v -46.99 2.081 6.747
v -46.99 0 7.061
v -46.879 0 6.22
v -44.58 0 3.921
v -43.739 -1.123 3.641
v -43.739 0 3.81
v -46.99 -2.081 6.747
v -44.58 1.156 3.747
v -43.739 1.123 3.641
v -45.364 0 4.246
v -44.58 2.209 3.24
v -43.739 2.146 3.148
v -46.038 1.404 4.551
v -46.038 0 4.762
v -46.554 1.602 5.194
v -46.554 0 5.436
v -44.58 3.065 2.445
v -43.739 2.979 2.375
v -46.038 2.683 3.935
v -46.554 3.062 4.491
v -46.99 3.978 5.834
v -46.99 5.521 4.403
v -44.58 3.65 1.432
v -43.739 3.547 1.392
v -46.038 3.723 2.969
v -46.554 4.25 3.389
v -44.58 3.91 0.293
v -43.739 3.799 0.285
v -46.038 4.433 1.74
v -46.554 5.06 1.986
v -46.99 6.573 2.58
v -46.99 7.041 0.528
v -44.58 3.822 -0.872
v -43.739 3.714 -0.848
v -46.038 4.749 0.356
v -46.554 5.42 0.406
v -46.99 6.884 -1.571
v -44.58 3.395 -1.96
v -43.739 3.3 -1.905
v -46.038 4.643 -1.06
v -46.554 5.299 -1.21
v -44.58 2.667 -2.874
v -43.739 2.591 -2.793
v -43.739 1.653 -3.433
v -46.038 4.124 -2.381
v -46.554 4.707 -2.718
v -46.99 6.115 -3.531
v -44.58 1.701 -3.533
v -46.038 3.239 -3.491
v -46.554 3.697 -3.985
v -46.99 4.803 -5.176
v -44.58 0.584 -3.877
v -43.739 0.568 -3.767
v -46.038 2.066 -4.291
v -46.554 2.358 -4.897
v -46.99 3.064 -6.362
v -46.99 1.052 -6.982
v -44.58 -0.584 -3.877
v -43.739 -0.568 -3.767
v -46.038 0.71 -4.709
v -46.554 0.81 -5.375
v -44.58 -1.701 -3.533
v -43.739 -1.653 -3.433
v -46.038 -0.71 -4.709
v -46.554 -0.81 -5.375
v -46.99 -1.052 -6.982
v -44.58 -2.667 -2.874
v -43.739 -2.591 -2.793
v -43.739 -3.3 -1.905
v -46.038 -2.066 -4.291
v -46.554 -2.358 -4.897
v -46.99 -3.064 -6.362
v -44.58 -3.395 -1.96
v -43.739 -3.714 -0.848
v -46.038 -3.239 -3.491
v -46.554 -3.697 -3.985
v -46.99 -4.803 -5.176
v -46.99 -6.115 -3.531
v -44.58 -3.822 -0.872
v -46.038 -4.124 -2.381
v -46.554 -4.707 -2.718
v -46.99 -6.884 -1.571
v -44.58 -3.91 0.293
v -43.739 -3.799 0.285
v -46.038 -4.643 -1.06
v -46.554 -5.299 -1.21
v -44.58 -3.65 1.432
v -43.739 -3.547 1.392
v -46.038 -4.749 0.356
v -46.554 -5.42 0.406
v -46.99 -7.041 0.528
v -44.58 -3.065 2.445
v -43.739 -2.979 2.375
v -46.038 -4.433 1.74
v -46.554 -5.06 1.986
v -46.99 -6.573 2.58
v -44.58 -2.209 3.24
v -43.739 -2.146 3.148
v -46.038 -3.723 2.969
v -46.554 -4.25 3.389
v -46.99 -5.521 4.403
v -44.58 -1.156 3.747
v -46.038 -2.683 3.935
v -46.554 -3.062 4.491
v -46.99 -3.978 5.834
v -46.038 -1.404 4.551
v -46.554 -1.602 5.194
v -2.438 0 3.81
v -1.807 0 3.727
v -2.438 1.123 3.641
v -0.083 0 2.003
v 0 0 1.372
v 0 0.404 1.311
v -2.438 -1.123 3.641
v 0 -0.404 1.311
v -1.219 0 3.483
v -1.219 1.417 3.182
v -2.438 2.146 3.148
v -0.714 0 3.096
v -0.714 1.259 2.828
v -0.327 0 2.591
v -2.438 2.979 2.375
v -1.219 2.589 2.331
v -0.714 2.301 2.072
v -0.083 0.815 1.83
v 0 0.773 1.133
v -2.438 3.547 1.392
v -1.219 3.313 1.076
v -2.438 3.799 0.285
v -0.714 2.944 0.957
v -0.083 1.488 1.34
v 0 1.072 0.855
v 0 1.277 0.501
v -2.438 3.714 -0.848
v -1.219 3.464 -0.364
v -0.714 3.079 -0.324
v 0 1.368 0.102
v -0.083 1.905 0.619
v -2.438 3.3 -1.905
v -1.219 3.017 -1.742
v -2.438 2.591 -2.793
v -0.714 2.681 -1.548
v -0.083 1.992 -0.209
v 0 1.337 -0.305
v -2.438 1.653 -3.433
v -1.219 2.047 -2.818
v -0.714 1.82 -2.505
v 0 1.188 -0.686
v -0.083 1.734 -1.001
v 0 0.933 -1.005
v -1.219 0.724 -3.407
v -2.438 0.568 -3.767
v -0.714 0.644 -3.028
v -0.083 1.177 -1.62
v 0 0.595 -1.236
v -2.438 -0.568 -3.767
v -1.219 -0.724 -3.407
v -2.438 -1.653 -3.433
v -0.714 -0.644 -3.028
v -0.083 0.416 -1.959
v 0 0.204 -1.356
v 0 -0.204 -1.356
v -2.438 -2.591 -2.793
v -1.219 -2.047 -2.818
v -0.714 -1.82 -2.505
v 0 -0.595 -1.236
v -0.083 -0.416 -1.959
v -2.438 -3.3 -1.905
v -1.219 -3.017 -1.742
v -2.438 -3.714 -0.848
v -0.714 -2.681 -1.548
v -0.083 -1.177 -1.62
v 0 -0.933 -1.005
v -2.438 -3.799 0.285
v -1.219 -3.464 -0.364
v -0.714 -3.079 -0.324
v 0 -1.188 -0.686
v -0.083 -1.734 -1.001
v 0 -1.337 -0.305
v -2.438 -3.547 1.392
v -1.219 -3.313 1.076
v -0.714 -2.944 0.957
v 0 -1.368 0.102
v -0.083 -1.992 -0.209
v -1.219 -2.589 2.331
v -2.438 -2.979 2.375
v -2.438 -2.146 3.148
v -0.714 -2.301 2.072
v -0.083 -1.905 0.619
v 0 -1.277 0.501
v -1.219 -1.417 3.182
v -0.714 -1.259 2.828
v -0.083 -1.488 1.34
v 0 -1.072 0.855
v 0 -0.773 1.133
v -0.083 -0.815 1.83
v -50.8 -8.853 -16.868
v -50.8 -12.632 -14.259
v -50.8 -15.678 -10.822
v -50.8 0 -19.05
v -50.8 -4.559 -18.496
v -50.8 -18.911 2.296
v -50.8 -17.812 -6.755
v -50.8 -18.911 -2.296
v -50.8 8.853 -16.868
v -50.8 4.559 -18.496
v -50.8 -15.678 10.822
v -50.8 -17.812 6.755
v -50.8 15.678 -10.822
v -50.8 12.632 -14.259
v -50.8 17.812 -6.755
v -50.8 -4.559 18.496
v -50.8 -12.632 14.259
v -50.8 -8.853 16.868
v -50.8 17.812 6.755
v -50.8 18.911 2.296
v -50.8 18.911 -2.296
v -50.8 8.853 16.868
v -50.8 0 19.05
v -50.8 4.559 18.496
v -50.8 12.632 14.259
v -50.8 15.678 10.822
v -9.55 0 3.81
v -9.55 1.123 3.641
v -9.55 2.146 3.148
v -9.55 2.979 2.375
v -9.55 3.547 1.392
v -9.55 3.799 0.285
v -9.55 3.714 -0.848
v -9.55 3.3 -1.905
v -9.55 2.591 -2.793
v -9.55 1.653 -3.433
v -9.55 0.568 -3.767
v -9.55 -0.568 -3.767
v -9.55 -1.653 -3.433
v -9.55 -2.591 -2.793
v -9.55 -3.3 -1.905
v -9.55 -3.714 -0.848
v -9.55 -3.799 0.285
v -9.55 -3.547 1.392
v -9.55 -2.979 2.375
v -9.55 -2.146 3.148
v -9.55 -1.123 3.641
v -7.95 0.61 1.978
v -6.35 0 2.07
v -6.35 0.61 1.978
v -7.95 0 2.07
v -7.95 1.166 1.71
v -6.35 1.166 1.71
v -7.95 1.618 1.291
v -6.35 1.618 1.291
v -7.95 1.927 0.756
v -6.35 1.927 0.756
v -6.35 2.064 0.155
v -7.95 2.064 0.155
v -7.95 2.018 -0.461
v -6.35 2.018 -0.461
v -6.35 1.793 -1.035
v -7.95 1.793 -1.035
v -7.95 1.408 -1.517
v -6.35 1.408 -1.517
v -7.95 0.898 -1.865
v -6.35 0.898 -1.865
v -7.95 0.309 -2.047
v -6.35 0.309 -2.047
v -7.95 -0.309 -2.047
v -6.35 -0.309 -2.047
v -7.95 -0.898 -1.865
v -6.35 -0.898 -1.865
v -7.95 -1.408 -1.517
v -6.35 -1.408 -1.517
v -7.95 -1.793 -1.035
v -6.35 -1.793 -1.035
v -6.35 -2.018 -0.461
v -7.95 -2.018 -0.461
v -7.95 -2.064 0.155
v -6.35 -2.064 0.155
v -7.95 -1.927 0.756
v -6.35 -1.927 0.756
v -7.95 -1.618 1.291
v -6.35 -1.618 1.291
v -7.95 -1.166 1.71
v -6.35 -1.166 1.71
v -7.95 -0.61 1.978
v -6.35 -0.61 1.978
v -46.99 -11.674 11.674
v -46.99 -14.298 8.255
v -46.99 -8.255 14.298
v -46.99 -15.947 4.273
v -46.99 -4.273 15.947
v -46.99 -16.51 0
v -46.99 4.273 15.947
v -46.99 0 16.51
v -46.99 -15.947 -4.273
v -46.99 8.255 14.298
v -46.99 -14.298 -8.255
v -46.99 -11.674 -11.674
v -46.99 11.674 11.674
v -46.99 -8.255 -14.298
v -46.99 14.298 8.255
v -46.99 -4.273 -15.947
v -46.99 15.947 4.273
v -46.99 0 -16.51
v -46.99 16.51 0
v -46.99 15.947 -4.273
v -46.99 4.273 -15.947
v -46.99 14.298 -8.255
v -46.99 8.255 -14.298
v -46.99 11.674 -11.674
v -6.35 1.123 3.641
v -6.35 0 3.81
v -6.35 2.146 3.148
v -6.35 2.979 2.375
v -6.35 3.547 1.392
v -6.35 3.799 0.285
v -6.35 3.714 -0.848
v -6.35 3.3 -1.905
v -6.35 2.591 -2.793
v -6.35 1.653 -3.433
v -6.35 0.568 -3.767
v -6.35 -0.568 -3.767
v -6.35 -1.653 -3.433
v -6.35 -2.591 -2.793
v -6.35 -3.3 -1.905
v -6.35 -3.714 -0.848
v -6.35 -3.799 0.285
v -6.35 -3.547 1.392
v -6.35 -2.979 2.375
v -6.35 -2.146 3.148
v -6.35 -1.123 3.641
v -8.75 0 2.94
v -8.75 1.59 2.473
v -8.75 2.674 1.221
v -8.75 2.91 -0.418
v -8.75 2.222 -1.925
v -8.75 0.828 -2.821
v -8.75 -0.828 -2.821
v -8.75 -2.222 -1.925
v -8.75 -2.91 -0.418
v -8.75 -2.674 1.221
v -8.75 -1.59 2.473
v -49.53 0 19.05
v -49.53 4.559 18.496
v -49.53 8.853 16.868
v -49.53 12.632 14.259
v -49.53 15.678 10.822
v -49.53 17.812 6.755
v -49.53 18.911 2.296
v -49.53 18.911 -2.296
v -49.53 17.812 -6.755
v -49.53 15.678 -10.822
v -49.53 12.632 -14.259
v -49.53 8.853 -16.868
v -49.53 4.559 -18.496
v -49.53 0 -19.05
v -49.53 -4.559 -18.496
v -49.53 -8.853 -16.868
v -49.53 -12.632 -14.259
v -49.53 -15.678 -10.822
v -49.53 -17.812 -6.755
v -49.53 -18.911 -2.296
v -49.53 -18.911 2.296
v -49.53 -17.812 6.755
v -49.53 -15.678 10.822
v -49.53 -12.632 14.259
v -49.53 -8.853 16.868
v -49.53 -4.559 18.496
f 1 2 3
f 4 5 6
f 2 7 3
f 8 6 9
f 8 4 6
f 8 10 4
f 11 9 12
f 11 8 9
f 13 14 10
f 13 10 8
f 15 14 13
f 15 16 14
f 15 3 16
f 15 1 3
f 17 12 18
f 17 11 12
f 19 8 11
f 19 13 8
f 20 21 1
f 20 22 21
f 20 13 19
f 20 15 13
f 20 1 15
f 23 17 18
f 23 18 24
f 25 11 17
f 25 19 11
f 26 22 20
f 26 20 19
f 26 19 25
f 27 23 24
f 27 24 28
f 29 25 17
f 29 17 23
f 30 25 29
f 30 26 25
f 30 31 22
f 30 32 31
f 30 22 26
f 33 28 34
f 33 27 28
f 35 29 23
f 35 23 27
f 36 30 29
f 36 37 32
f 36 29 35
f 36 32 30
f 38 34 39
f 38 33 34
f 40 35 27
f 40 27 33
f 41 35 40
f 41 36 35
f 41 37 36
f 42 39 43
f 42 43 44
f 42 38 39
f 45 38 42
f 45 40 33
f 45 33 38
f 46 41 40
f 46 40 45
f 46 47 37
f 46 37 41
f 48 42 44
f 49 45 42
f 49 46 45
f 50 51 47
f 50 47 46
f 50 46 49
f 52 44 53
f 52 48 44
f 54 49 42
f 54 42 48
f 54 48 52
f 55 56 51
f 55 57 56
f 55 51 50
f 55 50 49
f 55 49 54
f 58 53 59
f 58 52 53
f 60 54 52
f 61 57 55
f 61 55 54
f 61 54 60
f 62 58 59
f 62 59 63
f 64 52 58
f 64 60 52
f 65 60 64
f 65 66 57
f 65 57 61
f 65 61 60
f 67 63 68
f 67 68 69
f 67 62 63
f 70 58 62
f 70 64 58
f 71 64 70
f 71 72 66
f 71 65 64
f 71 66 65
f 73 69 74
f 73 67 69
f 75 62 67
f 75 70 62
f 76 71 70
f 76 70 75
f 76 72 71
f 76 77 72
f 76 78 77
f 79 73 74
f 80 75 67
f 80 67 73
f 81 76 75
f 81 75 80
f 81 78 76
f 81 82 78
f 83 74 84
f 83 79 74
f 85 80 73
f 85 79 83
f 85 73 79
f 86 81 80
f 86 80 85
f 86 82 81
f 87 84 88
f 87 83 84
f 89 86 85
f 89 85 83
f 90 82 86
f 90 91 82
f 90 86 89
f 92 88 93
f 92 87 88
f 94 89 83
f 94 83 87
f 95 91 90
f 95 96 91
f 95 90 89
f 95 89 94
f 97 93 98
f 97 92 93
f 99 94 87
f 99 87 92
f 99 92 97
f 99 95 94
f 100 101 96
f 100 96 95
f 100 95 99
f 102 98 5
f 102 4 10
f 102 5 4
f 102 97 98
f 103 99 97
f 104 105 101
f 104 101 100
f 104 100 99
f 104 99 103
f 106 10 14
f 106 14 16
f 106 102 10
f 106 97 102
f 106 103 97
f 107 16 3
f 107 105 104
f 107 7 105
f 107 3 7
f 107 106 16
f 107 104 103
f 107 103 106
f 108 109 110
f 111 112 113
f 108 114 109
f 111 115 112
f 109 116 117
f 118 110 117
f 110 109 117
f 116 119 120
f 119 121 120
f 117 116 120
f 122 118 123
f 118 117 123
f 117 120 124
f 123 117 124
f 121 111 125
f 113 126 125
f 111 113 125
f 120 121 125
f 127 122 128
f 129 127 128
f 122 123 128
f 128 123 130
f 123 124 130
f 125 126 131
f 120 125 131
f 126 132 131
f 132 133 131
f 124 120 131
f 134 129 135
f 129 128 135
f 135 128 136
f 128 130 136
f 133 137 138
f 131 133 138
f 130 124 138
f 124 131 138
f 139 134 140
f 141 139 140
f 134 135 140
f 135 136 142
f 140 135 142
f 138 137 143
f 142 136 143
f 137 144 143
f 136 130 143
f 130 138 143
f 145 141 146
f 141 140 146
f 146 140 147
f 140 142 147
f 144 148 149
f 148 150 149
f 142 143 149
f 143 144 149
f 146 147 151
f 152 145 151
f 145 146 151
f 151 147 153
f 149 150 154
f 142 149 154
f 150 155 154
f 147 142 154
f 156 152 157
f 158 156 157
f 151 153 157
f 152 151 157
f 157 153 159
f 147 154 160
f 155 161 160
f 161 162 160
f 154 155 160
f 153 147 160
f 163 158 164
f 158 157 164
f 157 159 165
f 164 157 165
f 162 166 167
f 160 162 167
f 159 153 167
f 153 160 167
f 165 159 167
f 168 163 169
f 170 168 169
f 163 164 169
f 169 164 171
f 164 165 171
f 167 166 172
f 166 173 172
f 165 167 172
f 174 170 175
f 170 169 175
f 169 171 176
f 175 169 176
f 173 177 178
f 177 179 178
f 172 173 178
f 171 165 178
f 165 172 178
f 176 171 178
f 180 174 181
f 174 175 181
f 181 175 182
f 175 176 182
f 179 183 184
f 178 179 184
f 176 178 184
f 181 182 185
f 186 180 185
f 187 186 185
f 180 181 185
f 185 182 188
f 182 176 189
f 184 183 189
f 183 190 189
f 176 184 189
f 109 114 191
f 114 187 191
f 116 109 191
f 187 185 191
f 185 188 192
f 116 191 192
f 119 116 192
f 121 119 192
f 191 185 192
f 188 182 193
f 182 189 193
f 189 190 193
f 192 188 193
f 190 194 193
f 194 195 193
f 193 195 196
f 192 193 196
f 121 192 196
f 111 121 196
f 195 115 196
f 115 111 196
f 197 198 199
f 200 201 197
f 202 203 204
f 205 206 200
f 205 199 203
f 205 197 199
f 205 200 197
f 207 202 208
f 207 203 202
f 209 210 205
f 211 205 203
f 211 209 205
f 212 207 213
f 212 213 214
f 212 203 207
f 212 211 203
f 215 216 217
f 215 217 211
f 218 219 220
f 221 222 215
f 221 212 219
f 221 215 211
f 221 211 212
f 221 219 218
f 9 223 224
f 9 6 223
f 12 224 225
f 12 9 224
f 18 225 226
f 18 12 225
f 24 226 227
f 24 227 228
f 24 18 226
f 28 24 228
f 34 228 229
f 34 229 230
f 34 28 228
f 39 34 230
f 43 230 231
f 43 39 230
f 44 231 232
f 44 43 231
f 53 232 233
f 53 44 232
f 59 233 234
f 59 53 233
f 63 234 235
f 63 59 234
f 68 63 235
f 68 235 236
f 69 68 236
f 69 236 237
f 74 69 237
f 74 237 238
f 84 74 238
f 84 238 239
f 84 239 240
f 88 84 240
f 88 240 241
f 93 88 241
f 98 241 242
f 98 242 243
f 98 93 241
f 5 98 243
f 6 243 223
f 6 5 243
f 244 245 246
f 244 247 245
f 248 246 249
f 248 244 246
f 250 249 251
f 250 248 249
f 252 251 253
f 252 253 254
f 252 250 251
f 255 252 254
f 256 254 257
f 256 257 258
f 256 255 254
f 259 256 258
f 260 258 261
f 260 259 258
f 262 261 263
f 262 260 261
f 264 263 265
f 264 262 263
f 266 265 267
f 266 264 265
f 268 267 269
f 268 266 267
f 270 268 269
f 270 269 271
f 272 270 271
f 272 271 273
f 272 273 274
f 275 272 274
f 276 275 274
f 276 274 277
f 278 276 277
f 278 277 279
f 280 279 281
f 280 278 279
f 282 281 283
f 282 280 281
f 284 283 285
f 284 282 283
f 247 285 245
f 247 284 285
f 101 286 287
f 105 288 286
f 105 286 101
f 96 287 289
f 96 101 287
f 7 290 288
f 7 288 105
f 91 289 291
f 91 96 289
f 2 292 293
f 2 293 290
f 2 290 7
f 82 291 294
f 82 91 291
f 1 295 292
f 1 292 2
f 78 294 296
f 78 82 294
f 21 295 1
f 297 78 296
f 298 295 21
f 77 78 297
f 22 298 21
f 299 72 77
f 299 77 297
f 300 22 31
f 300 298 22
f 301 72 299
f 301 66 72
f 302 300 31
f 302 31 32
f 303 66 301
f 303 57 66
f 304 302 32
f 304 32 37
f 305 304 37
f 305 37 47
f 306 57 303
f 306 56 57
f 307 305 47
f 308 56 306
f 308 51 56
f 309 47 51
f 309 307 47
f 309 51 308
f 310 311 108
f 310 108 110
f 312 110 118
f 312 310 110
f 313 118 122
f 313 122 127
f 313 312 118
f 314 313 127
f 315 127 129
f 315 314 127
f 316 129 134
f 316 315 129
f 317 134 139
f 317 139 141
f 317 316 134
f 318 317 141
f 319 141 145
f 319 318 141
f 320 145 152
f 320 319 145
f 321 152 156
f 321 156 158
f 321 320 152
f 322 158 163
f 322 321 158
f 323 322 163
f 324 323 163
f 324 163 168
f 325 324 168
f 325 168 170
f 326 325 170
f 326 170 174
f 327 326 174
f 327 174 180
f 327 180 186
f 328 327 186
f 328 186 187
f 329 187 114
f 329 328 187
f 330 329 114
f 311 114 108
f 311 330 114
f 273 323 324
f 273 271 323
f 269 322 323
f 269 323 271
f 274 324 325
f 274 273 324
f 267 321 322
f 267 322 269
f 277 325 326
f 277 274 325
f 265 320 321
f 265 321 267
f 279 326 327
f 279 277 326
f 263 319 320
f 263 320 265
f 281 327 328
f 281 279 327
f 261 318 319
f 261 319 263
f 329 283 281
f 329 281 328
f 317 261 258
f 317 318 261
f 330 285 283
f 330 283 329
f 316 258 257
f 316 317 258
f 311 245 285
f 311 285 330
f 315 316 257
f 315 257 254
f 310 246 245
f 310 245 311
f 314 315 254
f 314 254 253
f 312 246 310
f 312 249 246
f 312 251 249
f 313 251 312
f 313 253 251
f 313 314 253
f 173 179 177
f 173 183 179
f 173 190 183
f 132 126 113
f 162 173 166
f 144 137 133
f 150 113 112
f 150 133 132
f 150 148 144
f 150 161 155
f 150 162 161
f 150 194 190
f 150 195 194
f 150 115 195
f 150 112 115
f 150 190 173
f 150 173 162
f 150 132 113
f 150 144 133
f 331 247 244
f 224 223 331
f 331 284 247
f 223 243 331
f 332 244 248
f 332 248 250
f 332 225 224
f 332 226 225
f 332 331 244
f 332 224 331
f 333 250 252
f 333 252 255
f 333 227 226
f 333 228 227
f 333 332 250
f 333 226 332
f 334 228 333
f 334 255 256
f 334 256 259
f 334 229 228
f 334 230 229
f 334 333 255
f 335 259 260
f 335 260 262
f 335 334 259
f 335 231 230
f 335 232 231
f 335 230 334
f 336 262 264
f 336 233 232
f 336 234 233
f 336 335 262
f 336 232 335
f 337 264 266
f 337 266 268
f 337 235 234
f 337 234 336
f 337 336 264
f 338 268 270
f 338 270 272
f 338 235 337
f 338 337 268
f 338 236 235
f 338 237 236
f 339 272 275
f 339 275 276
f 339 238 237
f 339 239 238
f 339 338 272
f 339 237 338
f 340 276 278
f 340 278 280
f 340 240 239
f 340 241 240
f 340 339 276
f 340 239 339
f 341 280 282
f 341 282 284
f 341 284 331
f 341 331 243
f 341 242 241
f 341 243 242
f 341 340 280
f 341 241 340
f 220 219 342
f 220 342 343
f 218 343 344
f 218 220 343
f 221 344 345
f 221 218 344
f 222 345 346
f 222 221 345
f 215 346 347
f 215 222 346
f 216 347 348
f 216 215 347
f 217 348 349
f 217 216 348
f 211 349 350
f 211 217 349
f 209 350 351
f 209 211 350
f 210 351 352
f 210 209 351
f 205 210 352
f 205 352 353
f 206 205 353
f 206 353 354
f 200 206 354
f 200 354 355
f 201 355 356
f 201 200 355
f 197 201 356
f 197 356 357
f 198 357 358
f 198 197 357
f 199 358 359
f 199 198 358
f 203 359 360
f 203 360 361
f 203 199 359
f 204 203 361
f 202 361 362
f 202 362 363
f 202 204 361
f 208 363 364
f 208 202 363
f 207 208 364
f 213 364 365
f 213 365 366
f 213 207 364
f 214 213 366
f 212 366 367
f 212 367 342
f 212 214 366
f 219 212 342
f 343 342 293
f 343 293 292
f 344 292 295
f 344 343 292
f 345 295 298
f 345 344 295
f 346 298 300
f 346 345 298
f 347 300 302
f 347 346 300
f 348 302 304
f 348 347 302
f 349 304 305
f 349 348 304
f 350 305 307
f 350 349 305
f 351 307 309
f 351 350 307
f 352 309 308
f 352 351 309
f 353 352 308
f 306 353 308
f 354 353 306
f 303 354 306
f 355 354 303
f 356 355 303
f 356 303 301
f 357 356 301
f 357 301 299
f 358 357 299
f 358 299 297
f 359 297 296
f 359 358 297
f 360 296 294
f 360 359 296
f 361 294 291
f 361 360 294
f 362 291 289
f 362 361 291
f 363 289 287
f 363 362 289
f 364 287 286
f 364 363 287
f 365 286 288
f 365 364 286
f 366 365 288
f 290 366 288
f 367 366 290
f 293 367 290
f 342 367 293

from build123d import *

# Parameters (mm, degrees)
F2_SIZE2 = 2.54
F2_SIZE  = 2.54
F3_R     = 2.4384


with BuildPart() as f1:
    # F0 (on Front) → F1 (revolve)
    with BuildSketch(Plane.XZ):
        with BuildLine():
            Line((-50.8, 0), (0, 0))
            Line((0, 0), (0, 3.81))
            Line((0, 3.81), (-6.35, 3.81))
            Line((-6.35, 3.81), (-6.35, 2.0701))
            Line((-6.35, 2.0701), (-7.9502, 2.0701))
            Line((-7.9502, 2.0701), (-9.5504, 3.81))
            Line((-9.5504, 3.81), (-43.7388, 3.81))
            ThreePointArc((-43.7388, 3.81), (-46.037746, 4.762254), (-46.99, 7.0612))
            Line((-46.99, 7.0612), (-46.99, 19.05))
            Line((-46.99, 19.05), (-50.8, 19.05))
            Line((-50.8, 19.05), (-50.8, 0))
        make_face()
    revolve(axis=Axis((-25.4, 0, 0), (-1, 0, 0)))

    # F2
    f2_edges = [f1.edges().sort_by_distance(p)[0] for p in [
        (-46.99, 0, -19.05),
    ]]
    chamfer(f2_edges, length=F2_SIZE, length2=F2_SIZE2)

    # F3
    f3_edges = [f1.edges().sort_by_distance(p)[0] for p in [
        (0, 0, -3.81),
    ]]
    fillet(f3_edges, radius=F3_R)


solid = f1.part
